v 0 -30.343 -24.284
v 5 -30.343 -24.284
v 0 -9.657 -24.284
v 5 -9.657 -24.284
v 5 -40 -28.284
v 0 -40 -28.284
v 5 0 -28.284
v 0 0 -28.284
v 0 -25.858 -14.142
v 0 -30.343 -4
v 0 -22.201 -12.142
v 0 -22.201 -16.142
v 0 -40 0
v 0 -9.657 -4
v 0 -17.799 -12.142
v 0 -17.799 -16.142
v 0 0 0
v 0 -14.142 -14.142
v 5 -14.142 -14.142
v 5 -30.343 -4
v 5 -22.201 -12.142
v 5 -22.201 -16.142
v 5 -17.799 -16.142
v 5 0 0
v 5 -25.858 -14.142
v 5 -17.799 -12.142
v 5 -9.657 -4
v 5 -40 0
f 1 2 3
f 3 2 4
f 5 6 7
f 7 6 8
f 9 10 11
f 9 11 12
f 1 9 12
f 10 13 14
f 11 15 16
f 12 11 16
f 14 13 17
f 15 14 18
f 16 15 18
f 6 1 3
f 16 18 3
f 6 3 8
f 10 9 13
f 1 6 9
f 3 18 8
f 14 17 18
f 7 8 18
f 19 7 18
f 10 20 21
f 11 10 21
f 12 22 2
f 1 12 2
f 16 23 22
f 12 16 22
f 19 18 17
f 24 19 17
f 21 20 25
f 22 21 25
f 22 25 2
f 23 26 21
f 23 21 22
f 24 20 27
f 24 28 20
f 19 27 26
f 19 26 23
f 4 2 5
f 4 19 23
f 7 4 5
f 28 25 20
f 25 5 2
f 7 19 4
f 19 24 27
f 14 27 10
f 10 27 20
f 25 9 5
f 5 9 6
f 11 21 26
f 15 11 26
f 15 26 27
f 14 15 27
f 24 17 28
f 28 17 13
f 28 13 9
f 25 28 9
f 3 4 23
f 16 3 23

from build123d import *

# Parameters (mm, degrees)
BOSS_EXTRUDE1_DEPTH = 5
CUT_EXTRUDE1_DEPTH  = 50.244289009


with BuildPart() as part:
    # Sketch1 → Boss-Extrude1 (new body)
    with BuildSketch(Plane(origin=(0, 0, 0), x_dir=(0, 0, -1), z_dir=(1, 0, 0))):
        Polygon((0, 0), (0, -40), (14.142135624, -25.857864376), (28.284271247, -40), (28.284271247, 0), (14.142135624, -14.142135624), align=None)
    extrude(amount=BOSS_EXTRUDE1_DEPTH)

    # Sketch2 → Cut-Extrude1 (cut, through all)
    with BuildSketch(Plane(origin=(5, 0, 0), x_dir=(0, 0, -1), z_dir=(1, 0, 0))):
        Polygon((4, -30.343145751), (12.142135624, -22.201010127), (12.142135624, -17.798989873), (4, -9.656854249), align=None)
        Polygon((16.142135624, -17.798989873), (16.142135624, -22.201010127), (24.284271247, -30.343145751), (24.284271247, -9.656854249), align=None)
    extrude(amount=-CUT_EXTRUDE1_DEPTH, mode=Mode.SUBTRACT)


solid = part.part
